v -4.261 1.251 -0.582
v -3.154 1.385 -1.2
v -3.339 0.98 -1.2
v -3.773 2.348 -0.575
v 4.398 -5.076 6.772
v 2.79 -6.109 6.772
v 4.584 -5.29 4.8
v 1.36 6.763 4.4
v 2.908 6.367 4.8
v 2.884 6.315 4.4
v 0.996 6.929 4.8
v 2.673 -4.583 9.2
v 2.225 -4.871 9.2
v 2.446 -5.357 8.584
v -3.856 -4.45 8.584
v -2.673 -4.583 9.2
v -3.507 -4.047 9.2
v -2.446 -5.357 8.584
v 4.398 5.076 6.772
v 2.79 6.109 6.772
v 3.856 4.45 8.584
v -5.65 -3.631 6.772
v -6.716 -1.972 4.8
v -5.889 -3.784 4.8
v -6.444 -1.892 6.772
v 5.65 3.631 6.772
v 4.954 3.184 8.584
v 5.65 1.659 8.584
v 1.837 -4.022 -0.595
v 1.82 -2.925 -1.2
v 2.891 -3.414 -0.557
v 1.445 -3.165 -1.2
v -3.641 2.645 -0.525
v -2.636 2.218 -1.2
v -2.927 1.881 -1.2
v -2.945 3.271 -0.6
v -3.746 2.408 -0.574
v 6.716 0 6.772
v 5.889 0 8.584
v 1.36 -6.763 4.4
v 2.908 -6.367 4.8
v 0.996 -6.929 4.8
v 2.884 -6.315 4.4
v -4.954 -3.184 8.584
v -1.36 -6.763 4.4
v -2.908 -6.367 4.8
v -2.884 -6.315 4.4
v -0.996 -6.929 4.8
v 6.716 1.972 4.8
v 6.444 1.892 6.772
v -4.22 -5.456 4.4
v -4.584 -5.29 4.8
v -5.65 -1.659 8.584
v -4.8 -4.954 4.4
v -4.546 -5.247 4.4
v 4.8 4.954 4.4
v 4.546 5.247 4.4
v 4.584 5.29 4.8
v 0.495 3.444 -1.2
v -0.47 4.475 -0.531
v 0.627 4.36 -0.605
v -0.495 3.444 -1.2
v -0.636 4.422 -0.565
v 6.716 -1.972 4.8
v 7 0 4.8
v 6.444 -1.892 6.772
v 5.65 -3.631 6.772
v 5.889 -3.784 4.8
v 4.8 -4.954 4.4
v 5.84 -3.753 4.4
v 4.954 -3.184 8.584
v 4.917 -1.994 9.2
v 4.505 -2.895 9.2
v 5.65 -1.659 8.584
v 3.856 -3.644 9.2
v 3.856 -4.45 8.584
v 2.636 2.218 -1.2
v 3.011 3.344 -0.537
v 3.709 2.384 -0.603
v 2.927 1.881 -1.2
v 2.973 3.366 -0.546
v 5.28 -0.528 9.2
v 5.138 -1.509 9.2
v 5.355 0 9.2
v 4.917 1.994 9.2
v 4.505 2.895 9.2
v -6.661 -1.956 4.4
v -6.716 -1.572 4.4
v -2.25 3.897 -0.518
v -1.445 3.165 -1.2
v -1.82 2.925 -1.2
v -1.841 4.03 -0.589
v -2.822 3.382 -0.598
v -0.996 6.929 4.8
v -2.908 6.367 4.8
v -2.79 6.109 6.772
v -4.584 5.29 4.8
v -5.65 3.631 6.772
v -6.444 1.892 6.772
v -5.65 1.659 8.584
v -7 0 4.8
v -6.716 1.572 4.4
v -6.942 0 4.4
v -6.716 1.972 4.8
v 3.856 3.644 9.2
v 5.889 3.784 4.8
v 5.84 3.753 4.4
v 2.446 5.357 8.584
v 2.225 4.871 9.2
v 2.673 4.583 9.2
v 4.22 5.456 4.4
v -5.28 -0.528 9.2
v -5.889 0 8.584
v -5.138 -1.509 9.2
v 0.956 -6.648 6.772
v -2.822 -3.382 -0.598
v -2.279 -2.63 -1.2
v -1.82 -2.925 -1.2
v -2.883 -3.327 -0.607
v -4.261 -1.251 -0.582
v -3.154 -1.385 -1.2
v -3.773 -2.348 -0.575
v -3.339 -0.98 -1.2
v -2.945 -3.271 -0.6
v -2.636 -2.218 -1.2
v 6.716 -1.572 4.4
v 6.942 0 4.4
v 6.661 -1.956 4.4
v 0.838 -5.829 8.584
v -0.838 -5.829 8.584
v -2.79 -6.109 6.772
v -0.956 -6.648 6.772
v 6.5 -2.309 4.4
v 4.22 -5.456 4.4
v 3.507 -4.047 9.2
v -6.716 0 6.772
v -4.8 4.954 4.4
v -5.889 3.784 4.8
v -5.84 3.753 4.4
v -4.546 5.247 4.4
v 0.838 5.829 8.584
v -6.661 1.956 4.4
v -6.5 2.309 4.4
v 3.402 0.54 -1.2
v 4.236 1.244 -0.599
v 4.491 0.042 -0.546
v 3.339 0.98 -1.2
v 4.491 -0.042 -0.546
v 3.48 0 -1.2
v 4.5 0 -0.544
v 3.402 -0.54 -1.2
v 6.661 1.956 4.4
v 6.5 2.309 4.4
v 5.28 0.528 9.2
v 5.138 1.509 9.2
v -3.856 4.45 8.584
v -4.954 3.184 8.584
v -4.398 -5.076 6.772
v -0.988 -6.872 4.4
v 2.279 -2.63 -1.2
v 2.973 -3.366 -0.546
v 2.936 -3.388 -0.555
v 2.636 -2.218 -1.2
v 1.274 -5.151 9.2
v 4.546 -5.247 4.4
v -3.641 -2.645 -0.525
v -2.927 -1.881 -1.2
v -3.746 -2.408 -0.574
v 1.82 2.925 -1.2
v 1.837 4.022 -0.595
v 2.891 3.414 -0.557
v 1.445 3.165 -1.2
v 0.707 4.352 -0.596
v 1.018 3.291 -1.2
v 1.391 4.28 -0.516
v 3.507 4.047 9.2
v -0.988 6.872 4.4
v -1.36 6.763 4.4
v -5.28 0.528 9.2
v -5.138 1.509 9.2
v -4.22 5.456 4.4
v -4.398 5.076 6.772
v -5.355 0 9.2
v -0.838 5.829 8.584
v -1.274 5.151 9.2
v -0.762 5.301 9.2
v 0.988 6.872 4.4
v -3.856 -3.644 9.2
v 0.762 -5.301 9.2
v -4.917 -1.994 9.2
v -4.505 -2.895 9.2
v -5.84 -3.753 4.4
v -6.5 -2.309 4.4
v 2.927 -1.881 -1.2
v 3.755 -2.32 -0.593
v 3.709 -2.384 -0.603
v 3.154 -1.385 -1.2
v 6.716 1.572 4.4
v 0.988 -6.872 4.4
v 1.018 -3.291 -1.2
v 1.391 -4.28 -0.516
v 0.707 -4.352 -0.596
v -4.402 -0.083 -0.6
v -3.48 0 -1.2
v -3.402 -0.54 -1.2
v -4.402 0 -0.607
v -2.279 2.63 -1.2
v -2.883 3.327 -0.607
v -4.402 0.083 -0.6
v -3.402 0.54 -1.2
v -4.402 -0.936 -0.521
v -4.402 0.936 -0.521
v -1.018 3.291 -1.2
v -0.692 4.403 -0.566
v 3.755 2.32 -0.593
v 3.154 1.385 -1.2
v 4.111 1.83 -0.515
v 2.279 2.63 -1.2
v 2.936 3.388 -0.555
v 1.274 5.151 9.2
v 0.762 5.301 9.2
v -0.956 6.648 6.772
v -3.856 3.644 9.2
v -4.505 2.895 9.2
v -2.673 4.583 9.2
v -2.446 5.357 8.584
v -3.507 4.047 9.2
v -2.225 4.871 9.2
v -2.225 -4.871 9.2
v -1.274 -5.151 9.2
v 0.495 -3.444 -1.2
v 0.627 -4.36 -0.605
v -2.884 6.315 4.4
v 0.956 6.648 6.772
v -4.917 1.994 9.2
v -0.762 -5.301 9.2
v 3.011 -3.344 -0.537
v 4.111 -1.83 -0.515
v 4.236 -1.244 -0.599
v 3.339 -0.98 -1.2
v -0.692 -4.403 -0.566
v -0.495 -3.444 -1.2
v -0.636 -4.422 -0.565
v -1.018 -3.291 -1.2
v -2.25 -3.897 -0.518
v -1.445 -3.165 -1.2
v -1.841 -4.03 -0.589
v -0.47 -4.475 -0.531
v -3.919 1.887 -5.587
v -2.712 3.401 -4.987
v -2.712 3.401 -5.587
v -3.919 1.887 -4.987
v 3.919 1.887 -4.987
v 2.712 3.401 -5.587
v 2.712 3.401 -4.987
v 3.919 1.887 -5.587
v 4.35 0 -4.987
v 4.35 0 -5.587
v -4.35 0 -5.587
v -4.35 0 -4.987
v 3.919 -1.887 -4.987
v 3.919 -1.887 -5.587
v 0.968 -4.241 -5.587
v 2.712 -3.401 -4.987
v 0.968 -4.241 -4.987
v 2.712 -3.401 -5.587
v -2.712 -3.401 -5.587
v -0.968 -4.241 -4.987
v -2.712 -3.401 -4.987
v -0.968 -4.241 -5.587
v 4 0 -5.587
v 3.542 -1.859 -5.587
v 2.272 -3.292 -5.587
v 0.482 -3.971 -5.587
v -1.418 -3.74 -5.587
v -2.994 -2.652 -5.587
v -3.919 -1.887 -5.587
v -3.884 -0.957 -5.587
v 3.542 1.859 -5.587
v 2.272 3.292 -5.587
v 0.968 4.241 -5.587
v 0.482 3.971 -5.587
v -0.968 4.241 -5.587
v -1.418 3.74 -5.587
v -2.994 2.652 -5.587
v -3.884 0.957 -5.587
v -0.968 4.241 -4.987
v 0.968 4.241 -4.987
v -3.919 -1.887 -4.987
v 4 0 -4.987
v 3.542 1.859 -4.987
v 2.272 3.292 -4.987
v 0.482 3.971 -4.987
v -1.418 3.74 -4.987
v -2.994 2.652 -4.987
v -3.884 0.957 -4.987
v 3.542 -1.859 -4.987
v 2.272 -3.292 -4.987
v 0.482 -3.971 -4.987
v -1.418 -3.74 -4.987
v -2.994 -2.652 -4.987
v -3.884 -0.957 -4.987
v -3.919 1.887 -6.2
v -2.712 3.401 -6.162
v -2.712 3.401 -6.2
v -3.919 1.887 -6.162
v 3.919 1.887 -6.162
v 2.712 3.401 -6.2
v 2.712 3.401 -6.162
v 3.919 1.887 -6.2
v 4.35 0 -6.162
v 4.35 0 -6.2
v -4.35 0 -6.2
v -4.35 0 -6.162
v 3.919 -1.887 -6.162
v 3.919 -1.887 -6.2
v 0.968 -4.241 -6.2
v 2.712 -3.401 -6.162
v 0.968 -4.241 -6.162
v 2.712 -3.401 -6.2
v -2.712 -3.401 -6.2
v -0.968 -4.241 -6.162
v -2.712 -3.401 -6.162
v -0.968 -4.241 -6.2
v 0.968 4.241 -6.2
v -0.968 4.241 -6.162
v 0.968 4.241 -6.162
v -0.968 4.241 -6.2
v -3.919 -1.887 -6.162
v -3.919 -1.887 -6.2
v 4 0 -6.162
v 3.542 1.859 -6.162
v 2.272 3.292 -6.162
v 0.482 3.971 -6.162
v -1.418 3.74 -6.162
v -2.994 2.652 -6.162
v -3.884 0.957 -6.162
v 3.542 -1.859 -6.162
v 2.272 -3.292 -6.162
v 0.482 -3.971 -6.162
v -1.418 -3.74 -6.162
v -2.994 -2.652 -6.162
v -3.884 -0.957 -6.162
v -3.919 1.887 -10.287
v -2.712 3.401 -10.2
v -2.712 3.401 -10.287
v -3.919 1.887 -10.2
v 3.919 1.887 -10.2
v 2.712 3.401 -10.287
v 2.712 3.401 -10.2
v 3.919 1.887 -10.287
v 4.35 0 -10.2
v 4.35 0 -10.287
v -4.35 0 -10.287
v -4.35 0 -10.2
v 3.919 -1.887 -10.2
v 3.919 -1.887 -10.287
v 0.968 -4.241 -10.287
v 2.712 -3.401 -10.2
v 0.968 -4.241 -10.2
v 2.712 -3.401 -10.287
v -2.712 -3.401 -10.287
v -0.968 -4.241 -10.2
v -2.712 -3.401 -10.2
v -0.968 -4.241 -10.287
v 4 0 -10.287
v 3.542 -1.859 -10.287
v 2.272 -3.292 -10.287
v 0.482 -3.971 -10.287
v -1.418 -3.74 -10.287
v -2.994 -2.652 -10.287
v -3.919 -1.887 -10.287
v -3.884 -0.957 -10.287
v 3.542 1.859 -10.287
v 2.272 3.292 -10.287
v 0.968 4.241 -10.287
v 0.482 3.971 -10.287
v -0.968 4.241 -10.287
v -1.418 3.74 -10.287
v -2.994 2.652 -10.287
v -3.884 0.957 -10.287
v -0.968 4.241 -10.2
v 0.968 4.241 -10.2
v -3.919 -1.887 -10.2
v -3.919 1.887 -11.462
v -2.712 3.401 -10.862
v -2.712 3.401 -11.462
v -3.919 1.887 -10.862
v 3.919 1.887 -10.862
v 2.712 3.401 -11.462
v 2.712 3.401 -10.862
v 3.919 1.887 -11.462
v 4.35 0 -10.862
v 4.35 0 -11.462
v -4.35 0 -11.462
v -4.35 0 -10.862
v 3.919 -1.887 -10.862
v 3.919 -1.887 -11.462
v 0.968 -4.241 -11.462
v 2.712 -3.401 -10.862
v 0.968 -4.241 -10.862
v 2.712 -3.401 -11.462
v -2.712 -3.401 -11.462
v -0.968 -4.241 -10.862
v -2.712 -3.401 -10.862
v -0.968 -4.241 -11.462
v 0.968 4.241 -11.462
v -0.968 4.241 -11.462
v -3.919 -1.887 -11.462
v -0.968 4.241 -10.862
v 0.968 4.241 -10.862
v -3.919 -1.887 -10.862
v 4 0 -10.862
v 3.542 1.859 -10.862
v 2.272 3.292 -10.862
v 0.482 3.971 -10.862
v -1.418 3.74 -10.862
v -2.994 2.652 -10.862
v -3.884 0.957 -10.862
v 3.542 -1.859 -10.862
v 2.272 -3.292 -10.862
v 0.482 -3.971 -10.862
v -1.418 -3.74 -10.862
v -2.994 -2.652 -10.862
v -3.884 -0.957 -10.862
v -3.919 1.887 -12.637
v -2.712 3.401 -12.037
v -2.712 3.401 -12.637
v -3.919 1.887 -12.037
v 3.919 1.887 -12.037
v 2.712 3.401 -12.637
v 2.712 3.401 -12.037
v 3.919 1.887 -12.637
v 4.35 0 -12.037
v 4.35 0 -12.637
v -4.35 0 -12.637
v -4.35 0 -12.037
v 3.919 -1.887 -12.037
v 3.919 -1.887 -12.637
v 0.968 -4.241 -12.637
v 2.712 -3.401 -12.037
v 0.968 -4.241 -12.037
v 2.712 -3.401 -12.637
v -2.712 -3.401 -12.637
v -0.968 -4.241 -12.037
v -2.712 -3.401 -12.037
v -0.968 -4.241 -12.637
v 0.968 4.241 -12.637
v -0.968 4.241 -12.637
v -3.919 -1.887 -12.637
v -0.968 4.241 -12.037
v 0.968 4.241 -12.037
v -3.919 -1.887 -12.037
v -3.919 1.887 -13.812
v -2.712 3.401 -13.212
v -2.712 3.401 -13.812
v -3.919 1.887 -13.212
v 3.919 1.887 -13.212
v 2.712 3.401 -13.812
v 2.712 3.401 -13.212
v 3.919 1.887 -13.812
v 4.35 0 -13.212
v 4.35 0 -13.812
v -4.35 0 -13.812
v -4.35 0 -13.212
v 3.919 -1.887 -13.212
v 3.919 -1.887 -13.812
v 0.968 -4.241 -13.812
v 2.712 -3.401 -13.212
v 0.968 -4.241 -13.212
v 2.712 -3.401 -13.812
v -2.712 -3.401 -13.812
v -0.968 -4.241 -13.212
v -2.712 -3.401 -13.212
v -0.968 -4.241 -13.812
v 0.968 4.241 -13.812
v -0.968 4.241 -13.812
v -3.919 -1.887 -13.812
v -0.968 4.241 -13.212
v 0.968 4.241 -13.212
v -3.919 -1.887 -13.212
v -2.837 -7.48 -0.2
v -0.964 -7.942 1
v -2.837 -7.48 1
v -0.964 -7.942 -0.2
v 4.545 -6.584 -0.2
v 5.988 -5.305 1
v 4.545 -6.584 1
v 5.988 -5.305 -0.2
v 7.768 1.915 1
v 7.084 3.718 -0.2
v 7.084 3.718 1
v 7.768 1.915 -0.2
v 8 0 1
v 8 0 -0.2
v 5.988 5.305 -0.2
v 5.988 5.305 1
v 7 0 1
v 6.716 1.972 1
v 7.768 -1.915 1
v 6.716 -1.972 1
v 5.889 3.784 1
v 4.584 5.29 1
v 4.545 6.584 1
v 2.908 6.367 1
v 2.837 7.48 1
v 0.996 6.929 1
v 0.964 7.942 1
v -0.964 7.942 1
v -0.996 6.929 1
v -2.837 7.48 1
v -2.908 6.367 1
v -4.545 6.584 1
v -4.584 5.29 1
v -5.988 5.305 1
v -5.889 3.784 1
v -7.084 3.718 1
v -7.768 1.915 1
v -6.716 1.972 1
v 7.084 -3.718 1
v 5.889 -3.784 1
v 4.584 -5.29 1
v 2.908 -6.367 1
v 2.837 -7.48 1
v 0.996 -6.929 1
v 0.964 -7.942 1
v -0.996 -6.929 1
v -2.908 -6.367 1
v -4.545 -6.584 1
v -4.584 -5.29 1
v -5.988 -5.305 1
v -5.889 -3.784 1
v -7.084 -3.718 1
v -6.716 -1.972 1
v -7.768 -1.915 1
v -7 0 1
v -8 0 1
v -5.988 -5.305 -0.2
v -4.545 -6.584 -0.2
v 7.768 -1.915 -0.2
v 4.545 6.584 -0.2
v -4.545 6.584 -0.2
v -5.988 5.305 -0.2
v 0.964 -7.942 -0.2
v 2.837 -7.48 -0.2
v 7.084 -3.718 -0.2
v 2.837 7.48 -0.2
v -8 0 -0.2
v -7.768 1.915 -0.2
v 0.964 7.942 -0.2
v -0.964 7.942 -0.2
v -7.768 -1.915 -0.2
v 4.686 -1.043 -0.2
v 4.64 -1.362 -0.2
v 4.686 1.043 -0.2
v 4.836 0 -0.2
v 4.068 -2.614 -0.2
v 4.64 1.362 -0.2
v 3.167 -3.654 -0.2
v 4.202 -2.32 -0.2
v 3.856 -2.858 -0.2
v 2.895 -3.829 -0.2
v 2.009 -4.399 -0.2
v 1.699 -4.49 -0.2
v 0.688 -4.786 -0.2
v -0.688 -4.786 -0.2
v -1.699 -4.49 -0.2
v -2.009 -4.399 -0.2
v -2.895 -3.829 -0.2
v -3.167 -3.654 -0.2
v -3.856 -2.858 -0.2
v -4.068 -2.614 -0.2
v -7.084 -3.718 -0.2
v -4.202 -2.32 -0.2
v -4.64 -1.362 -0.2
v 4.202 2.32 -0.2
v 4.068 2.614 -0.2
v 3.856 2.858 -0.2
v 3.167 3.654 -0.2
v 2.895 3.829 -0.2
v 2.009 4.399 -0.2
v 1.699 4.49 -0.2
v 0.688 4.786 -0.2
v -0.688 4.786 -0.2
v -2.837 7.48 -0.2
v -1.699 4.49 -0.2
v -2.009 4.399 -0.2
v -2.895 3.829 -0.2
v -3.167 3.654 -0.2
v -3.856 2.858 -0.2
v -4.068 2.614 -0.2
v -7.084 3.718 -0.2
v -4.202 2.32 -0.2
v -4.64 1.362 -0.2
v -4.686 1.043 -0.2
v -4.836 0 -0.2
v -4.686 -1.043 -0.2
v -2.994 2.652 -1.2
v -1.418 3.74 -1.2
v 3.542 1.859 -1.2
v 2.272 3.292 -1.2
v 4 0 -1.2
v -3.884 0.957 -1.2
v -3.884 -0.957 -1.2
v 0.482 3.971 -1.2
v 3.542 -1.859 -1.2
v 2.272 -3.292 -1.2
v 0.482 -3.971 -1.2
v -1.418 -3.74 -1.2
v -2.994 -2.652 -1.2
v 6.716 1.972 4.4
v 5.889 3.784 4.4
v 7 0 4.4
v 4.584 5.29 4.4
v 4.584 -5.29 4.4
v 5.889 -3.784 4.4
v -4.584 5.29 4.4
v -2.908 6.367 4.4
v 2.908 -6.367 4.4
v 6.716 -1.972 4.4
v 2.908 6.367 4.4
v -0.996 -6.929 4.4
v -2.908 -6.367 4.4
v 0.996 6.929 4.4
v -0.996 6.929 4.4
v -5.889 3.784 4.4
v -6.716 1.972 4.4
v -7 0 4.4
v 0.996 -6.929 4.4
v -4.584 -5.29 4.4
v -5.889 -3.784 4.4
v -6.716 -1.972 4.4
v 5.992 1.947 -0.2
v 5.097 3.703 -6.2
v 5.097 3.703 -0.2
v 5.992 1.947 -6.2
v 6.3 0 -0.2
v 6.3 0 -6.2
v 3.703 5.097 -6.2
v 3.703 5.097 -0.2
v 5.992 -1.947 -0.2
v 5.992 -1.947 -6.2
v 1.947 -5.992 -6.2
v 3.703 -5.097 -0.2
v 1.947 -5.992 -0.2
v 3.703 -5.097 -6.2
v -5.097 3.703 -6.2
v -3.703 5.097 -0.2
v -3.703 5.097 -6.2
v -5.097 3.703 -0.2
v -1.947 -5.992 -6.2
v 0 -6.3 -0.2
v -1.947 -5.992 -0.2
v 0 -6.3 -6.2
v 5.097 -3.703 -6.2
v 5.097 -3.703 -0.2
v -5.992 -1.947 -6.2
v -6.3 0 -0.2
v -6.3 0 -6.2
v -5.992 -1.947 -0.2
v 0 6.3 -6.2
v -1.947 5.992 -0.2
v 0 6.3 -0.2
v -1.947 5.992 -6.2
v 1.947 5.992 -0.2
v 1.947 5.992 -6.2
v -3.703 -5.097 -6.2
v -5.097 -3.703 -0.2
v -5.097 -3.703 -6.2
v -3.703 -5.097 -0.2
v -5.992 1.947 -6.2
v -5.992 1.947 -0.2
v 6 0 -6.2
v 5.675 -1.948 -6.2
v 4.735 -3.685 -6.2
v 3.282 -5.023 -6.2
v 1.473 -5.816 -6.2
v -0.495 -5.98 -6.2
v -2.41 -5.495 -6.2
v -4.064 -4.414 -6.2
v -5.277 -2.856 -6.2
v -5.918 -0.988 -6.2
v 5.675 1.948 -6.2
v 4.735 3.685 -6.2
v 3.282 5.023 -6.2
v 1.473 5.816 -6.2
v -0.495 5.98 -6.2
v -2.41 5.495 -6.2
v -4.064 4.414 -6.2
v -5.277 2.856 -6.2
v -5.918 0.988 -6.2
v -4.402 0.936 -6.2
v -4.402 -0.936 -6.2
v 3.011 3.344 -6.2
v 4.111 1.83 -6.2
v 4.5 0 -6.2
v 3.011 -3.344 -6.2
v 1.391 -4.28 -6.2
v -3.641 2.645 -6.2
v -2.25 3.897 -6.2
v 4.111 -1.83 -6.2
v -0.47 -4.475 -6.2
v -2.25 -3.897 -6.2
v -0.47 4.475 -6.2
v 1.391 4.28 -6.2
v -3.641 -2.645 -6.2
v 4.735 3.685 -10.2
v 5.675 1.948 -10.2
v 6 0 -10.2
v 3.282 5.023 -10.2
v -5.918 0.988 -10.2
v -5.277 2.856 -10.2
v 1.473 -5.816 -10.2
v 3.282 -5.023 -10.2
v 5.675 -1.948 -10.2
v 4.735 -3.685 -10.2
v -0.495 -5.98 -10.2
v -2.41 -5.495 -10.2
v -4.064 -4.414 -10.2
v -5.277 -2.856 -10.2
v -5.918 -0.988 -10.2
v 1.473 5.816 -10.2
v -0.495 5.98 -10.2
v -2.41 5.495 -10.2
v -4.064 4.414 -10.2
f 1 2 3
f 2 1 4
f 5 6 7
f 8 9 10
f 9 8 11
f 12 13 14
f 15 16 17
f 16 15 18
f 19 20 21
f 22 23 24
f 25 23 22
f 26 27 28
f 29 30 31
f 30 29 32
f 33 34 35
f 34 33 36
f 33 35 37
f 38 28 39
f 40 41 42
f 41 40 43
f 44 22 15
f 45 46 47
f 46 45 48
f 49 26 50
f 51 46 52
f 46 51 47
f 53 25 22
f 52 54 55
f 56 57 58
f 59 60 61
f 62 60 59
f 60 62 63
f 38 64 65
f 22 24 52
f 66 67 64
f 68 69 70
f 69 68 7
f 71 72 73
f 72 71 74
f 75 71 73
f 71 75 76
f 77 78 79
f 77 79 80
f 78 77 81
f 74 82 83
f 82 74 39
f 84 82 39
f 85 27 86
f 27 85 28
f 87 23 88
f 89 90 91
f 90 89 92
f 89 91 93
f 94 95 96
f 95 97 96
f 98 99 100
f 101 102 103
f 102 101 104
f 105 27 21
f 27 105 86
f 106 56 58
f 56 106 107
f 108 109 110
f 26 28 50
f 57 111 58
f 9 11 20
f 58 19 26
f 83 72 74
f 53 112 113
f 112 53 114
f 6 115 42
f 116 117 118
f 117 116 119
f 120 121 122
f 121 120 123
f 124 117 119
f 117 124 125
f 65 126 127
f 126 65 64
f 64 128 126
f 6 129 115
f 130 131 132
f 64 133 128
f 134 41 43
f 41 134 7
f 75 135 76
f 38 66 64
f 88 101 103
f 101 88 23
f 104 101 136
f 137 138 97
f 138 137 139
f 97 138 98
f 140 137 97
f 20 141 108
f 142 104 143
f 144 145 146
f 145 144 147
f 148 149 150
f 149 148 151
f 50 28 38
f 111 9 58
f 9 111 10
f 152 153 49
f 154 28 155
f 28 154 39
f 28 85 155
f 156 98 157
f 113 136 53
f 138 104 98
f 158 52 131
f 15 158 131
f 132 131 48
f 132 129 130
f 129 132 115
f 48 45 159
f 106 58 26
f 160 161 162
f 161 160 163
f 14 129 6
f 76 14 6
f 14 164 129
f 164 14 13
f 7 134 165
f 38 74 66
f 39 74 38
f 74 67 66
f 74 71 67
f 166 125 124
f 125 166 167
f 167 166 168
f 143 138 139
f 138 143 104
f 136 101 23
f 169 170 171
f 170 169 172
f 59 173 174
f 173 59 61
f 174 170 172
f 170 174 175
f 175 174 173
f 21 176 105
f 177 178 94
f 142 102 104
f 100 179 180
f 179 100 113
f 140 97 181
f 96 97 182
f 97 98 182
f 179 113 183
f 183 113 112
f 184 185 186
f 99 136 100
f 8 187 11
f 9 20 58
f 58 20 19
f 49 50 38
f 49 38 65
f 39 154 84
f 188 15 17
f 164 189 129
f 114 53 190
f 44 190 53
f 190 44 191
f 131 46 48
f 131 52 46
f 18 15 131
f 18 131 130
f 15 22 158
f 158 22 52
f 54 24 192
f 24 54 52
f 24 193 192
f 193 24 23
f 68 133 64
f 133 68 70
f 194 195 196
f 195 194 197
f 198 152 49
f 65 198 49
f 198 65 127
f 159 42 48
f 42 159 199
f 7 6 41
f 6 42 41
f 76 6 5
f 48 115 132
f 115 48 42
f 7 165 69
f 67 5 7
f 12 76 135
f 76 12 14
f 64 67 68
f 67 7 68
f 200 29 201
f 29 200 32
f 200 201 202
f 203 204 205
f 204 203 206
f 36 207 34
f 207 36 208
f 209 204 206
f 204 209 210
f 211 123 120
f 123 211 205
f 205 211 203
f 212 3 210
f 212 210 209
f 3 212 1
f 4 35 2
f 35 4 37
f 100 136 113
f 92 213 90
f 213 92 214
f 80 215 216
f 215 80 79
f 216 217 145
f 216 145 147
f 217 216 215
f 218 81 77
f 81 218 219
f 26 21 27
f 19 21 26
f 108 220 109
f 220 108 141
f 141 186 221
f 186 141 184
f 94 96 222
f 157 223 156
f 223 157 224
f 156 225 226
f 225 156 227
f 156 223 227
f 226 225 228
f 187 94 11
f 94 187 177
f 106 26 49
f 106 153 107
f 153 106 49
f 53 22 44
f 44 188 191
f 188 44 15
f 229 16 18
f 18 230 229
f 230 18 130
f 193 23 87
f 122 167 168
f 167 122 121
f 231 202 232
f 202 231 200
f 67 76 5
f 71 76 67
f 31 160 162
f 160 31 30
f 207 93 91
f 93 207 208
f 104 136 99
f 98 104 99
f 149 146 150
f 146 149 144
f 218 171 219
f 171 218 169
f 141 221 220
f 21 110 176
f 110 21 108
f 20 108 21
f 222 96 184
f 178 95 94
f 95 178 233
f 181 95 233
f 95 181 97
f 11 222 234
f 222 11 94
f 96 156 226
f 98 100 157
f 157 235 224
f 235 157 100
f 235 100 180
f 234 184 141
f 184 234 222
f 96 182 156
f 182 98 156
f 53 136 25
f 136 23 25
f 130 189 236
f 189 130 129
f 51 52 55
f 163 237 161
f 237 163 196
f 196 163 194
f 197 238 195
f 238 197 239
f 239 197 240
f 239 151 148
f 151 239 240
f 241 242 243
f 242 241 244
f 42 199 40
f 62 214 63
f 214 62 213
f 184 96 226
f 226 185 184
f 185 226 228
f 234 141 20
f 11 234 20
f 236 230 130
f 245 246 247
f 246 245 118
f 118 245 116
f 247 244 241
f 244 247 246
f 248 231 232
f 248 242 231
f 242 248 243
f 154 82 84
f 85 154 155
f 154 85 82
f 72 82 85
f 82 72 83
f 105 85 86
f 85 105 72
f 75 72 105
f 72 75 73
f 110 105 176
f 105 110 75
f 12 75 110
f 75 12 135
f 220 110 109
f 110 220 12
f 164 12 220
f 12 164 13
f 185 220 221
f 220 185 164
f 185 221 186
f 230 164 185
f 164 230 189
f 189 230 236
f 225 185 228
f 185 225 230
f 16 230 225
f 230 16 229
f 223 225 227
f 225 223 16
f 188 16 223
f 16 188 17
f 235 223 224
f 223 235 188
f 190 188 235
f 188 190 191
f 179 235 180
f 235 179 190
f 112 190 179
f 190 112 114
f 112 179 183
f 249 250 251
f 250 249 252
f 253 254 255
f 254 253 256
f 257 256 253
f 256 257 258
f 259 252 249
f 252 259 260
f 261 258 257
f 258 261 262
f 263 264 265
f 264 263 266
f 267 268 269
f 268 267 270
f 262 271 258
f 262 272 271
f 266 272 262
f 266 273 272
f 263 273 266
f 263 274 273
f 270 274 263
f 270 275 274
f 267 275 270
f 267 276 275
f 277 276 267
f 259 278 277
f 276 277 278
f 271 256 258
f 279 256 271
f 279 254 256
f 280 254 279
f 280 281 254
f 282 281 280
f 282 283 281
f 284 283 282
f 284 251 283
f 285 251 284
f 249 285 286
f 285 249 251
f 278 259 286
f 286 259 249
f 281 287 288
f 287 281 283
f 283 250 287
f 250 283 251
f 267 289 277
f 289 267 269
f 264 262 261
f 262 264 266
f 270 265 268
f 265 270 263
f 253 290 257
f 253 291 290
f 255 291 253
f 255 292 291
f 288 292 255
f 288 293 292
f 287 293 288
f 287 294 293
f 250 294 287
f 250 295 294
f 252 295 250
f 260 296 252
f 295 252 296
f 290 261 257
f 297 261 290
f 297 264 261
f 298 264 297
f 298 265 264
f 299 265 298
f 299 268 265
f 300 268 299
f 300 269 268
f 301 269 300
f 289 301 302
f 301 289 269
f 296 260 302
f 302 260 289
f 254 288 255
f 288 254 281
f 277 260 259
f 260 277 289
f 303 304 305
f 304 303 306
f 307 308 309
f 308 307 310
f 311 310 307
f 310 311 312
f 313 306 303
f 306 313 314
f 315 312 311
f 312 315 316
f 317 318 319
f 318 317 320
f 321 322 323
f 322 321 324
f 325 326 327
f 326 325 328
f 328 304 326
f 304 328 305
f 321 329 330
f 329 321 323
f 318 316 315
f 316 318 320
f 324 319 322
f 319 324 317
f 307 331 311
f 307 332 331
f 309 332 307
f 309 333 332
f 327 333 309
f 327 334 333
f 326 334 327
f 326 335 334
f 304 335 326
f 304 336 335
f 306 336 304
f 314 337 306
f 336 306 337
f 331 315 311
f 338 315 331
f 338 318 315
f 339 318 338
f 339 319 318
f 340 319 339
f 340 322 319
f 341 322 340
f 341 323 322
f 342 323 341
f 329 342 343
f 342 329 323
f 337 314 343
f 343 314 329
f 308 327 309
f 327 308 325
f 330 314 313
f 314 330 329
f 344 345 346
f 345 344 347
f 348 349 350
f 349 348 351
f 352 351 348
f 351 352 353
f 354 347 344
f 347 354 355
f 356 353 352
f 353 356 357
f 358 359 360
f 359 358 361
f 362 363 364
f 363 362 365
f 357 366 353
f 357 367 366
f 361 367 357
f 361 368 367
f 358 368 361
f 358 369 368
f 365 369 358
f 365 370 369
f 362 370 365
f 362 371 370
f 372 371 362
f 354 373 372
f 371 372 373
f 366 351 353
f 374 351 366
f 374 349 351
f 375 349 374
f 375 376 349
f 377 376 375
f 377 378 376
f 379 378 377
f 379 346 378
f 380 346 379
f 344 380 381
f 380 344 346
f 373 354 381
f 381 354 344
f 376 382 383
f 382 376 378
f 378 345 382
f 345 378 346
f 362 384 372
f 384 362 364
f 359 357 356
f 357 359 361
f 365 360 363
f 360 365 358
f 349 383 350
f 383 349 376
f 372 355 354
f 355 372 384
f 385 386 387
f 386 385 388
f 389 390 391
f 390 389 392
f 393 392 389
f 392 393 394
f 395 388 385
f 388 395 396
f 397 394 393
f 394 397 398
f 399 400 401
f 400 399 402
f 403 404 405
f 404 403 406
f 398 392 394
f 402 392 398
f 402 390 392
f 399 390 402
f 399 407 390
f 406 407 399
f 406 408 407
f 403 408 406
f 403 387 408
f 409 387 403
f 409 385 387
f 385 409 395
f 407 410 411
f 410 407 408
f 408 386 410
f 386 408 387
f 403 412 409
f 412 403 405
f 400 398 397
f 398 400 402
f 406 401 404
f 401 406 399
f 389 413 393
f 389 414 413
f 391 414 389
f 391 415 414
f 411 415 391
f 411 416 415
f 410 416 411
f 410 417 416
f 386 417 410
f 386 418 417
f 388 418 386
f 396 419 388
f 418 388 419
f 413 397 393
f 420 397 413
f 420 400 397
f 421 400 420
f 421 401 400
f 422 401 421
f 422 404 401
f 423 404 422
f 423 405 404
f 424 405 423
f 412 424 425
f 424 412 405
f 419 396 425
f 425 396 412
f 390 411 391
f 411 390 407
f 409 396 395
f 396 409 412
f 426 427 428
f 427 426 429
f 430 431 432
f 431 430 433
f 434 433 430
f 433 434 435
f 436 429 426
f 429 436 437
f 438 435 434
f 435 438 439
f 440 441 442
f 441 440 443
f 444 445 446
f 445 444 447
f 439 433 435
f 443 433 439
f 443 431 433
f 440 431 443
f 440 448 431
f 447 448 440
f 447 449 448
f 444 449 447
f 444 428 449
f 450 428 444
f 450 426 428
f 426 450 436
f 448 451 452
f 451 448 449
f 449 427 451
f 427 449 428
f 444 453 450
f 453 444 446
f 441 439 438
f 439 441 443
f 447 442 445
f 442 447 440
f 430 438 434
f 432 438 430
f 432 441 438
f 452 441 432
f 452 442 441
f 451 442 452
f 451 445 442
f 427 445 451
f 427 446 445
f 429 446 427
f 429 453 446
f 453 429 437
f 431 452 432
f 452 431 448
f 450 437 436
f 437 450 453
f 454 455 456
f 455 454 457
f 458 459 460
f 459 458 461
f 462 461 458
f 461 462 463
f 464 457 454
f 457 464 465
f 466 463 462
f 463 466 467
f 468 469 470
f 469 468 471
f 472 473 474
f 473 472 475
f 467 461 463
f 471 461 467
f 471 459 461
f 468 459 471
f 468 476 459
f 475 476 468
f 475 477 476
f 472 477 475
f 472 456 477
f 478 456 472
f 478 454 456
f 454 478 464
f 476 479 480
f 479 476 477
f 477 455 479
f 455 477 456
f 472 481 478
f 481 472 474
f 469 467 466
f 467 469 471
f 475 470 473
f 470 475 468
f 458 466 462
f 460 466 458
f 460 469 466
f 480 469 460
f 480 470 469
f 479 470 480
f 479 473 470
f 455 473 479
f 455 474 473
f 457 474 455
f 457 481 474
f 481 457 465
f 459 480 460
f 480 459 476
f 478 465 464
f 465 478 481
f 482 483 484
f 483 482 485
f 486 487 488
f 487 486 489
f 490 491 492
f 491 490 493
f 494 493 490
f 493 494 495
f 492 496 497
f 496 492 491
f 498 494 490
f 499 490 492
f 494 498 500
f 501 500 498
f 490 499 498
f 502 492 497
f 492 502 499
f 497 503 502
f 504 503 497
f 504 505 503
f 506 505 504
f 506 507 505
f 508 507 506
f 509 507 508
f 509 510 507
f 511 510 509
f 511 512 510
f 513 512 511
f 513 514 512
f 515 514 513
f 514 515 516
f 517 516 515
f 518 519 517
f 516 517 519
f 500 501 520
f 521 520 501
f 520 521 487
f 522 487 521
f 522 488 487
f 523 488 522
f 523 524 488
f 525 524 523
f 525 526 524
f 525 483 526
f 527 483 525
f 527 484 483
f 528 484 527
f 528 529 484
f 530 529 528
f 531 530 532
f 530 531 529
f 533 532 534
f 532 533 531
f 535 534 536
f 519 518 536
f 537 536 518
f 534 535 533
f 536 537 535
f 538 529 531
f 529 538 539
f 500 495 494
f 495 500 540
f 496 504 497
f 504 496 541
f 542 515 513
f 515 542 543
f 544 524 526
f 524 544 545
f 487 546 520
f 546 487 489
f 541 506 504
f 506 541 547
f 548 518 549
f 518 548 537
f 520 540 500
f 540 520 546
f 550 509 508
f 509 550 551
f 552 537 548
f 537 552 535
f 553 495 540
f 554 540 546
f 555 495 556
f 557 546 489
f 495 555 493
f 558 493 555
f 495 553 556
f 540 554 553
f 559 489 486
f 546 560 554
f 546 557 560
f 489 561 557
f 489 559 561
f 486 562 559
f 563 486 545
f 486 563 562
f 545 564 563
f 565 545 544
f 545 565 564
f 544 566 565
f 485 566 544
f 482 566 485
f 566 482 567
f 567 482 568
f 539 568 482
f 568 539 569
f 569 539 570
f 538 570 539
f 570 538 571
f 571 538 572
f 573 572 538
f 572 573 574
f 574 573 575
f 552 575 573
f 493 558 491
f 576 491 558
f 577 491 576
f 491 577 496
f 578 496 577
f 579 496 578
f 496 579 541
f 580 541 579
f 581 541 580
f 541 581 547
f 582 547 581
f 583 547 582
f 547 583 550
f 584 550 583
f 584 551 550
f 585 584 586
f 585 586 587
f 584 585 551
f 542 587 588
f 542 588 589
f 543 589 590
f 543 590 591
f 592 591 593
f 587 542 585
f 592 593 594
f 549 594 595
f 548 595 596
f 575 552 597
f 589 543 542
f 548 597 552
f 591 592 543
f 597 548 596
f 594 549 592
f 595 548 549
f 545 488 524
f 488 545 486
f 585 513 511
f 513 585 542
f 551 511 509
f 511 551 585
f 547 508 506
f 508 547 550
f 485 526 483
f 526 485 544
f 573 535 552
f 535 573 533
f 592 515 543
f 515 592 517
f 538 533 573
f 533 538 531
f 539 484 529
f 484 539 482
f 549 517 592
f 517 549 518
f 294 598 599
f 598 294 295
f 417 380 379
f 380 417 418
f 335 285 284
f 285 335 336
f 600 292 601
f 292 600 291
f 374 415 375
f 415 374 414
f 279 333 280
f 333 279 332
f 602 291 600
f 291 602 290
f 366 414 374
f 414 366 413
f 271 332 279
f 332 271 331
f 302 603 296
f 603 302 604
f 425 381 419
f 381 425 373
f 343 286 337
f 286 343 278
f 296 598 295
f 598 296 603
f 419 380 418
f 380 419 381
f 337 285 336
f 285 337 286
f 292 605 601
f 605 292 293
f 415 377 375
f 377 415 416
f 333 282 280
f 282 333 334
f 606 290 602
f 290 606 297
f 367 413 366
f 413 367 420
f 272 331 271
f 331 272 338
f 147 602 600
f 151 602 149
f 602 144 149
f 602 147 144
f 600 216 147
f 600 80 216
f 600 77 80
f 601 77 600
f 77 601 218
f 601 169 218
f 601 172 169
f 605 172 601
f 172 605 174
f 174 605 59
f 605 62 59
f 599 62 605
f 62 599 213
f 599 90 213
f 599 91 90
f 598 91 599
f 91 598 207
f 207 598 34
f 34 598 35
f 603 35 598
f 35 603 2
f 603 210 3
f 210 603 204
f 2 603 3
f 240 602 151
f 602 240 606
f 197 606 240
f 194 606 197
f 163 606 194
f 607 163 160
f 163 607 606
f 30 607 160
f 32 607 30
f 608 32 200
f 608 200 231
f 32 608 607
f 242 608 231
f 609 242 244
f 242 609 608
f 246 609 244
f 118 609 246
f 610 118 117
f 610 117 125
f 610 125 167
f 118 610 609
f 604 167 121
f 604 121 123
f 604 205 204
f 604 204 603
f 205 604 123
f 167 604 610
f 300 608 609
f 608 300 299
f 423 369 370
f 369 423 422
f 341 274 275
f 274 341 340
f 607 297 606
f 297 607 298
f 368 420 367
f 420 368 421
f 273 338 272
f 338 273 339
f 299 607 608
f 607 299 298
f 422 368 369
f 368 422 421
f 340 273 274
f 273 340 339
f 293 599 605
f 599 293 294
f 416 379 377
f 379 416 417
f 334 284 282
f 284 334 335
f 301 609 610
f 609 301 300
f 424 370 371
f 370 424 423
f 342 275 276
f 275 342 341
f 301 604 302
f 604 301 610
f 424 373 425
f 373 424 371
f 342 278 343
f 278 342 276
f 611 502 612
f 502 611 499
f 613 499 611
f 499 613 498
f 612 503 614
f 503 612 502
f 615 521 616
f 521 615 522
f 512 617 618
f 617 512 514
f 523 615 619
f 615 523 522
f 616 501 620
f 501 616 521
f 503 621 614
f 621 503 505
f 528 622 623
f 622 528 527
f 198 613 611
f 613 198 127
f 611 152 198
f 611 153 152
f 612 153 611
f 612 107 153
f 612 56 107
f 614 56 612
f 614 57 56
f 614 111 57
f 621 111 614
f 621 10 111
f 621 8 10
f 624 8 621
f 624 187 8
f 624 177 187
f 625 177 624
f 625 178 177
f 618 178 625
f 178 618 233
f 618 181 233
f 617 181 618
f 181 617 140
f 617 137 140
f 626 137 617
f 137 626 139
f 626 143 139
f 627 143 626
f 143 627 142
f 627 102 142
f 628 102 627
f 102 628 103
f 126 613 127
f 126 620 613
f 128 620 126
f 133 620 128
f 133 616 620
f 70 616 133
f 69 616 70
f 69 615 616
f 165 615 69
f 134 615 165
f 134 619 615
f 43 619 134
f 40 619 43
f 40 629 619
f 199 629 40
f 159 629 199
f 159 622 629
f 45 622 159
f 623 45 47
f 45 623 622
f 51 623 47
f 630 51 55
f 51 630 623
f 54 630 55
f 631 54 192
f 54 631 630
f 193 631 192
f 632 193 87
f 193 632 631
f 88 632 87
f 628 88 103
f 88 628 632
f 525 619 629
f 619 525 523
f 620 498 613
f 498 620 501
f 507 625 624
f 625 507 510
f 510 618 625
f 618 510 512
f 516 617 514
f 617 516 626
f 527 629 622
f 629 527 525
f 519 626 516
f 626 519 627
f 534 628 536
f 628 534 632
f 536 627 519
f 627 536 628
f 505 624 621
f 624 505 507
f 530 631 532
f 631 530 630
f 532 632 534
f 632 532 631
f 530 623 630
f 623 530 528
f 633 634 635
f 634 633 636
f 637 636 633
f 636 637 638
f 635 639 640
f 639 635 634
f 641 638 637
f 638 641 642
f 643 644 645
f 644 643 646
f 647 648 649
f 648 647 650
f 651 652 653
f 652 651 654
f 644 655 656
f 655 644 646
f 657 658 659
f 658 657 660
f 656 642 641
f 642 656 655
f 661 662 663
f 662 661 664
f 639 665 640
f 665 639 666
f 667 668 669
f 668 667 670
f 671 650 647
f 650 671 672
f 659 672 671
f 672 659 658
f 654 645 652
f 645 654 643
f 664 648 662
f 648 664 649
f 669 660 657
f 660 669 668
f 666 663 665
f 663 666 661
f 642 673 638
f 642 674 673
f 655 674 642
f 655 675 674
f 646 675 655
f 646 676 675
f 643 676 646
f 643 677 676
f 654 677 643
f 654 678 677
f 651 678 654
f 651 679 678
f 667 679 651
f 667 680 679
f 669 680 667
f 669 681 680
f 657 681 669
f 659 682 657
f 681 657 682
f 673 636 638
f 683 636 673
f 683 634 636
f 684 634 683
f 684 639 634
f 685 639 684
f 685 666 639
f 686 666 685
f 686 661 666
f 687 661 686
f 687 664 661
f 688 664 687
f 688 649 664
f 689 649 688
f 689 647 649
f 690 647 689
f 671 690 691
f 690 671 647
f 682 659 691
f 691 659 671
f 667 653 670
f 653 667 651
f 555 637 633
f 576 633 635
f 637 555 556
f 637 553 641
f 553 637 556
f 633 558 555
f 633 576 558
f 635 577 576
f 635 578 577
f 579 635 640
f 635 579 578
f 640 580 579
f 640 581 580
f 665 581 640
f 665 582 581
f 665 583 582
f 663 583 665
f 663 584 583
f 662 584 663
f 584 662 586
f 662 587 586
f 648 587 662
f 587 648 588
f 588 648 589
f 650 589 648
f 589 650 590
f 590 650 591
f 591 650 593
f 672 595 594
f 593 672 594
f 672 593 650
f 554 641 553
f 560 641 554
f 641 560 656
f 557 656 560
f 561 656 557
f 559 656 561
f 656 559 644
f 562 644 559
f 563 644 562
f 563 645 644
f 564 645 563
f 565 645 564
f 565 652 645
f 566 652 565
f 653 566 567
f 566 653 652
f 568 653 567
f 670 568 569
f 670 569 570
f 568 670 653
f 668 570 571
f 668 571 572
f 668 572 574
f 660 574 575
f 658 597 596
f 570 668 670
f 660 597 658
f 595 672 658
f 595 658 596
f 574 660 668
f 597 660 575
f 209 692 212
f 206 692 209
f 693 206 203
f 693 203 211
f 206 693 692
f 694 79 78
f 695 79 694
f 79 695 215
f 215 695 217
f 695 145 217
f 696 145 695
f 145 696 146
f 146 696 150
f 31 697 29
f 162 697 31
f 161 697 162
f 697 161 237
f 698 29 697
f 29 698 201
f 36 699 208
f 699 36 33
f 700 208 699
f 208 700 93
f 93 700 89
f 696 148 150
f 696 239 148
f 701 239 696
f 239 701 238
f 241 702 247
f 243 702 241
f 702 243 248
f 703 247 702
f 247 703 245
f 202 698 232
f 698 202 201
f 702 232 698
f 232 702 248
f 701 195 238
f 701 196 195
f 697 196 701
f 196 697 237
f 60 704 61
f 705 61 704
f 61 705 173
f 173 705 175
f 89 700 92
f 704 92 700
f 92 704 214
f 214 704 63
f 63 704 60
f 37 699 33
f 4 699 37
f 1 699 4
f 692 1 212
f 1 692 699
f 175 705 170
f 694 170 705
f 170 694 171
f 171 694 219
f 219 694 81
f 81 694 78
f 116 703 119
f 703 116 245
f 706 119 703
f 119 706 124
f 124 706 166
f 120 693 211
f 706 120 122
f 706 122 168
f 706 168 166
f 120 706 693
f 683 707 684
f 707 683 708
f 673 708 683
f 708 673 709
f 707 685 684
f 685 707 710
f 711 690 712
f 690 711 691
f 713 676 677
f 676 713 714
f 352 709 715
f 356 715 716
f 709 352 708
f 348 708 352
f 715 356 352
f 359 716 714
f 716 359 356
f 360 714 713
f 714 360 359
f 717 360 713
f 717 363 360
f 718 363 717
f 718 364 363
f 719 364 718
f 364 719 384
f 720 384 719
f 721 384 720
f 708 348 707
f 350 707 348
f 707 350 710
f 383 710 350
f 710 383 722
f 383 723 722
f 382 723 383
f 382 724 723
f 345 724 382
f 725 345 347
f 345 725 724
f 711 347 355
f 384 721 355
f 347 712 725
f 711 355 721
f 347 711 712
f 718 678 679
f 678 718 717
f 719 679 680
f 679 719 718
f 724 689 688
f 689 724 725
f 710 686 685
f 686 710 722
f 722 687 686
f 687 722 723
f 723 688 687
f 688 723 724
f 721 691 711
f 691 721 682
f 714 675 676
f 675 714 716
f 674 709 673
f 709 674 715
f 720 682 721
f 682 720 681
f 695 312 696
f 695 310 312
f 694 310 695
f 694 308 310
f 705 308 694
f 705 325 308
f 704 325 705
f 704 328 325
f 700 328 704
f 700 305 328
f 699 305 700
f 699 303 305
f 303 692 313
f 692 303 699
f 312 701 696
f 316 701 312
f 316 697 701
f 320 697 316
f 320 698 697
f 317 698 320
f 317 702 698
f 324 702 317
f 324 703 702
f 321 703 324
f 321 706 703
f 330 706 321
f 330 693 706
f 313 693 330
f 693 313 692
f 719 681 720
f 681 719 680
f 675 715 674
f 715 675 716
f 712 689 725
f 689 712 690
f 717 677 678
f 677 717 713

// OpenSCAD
// Parameters
thread_diameter = 8; //[4:16:0.1]
head_diameter = 14; //[7:28:0.1]
head_height = 4.4; //[2.2:8.8:0.1]
length_under_head = 10; //[5:20:0.1]
overlap = 1; //[0.5:2:0.1]
shaft_radius = 4; //[2:8:0.1]
head_radius = 7; //[3.5:14:0.1]
thread_ring_count = 8; //[4:20:1]
thread_ring_height = 0.6; //[0.3:1.2:0.1]
thread_ring_radial = 0.35; //[0.15:0.8:0.05]
washer_outer_diameter = 16; //[8:32:0.1]
washer_thickness = 1.2; //[0.6:2.4:0.1]
washer_clearance = 0.5; //[0.2:1:0.1]
spacer_height = 6; //[3:12:0.1]
spacer_wall = 1.8; //[0.9:3.6:0.1]
buzzer_radius = 6; //[3:12:0.1]
buzzer_height = 4; //[2:8:0.1]

// PCB Spacer - complete geometry
module pcb_spacer() {
  color([0.85, 0.85, 0.8]) {
    difference() {
      cylinder(r=thread_diameter/2 + washer_clearance + spacer_wall, h=spacer_height, center=true);
      translate([0, 0, -overlap])
        cylinder(r=thread_diameter/2 + washer_clearance, h=spacer_height + overlap*2, center=true);
    }
  }
}

// Screw and Washer - complete geometry
module screw_and_washer() {
  color("DimGray") {
    // Screw Shaft
    translate([0, 0, -head_height/2 - length_under_head/2 + overlap])
      cylinder(r=shaft_radius, h=length_under_head, center=true);
    
    // Dome Head
    intersection() {
      translate([0, 0, head_diameter/2 - head_height/2])
        sphere(r=head_radius, center=true);
      translate([0, 0, head_height/2])
        cube([head_diameter*2, head_diameter*2, head_diameter], center=true);
    }
    translate([0, 0, head_height/2])
      cylinder(r=head_radius, h=head_height, center=true);
    
    // Thread Representation
    for (i = [0:thread_ring_count-1]) {
      translate([0, 0, -head_height - thread_ring_height/2 - (length_under_head - thread_ring_height) * (i + 0.5)/thread_ring_count])
        cylinder(r=shaft_radius + thread_ring_radial, h=thread_ring_height, center=true);
    }
    
    // Washer
    difference() {
      translate([0, 0, -washer_thickness/2 + overlap])
        cylinder(r=washer_outer_diameter/2, h=washer_thickness, center=true);
      translate([0, 0, -washer_thickness/2 + overlap])
        cylinder(r=shaft_radius + washer_clearance, h=washer_thickness + overlap*2, center=true);
    }
  }
}

// Buzzer - complete geometry
module buzzer() {
  color([0.1, 0.1, 0.6]) {
    translate([0, 0, -washer_thickness - spacer_height - buzzer_height/2 + overlap])
      cylinder(r=buzzer_radius, h=buzzer_height, center=true);
  }
}

// Assembly
module assembly() {
  screw_and_washer();
  translate([0, 0, -washer_thickness - spacer_height/2 + overlap])
    pcb_spacer();
  buzzer();
}

assembly();
